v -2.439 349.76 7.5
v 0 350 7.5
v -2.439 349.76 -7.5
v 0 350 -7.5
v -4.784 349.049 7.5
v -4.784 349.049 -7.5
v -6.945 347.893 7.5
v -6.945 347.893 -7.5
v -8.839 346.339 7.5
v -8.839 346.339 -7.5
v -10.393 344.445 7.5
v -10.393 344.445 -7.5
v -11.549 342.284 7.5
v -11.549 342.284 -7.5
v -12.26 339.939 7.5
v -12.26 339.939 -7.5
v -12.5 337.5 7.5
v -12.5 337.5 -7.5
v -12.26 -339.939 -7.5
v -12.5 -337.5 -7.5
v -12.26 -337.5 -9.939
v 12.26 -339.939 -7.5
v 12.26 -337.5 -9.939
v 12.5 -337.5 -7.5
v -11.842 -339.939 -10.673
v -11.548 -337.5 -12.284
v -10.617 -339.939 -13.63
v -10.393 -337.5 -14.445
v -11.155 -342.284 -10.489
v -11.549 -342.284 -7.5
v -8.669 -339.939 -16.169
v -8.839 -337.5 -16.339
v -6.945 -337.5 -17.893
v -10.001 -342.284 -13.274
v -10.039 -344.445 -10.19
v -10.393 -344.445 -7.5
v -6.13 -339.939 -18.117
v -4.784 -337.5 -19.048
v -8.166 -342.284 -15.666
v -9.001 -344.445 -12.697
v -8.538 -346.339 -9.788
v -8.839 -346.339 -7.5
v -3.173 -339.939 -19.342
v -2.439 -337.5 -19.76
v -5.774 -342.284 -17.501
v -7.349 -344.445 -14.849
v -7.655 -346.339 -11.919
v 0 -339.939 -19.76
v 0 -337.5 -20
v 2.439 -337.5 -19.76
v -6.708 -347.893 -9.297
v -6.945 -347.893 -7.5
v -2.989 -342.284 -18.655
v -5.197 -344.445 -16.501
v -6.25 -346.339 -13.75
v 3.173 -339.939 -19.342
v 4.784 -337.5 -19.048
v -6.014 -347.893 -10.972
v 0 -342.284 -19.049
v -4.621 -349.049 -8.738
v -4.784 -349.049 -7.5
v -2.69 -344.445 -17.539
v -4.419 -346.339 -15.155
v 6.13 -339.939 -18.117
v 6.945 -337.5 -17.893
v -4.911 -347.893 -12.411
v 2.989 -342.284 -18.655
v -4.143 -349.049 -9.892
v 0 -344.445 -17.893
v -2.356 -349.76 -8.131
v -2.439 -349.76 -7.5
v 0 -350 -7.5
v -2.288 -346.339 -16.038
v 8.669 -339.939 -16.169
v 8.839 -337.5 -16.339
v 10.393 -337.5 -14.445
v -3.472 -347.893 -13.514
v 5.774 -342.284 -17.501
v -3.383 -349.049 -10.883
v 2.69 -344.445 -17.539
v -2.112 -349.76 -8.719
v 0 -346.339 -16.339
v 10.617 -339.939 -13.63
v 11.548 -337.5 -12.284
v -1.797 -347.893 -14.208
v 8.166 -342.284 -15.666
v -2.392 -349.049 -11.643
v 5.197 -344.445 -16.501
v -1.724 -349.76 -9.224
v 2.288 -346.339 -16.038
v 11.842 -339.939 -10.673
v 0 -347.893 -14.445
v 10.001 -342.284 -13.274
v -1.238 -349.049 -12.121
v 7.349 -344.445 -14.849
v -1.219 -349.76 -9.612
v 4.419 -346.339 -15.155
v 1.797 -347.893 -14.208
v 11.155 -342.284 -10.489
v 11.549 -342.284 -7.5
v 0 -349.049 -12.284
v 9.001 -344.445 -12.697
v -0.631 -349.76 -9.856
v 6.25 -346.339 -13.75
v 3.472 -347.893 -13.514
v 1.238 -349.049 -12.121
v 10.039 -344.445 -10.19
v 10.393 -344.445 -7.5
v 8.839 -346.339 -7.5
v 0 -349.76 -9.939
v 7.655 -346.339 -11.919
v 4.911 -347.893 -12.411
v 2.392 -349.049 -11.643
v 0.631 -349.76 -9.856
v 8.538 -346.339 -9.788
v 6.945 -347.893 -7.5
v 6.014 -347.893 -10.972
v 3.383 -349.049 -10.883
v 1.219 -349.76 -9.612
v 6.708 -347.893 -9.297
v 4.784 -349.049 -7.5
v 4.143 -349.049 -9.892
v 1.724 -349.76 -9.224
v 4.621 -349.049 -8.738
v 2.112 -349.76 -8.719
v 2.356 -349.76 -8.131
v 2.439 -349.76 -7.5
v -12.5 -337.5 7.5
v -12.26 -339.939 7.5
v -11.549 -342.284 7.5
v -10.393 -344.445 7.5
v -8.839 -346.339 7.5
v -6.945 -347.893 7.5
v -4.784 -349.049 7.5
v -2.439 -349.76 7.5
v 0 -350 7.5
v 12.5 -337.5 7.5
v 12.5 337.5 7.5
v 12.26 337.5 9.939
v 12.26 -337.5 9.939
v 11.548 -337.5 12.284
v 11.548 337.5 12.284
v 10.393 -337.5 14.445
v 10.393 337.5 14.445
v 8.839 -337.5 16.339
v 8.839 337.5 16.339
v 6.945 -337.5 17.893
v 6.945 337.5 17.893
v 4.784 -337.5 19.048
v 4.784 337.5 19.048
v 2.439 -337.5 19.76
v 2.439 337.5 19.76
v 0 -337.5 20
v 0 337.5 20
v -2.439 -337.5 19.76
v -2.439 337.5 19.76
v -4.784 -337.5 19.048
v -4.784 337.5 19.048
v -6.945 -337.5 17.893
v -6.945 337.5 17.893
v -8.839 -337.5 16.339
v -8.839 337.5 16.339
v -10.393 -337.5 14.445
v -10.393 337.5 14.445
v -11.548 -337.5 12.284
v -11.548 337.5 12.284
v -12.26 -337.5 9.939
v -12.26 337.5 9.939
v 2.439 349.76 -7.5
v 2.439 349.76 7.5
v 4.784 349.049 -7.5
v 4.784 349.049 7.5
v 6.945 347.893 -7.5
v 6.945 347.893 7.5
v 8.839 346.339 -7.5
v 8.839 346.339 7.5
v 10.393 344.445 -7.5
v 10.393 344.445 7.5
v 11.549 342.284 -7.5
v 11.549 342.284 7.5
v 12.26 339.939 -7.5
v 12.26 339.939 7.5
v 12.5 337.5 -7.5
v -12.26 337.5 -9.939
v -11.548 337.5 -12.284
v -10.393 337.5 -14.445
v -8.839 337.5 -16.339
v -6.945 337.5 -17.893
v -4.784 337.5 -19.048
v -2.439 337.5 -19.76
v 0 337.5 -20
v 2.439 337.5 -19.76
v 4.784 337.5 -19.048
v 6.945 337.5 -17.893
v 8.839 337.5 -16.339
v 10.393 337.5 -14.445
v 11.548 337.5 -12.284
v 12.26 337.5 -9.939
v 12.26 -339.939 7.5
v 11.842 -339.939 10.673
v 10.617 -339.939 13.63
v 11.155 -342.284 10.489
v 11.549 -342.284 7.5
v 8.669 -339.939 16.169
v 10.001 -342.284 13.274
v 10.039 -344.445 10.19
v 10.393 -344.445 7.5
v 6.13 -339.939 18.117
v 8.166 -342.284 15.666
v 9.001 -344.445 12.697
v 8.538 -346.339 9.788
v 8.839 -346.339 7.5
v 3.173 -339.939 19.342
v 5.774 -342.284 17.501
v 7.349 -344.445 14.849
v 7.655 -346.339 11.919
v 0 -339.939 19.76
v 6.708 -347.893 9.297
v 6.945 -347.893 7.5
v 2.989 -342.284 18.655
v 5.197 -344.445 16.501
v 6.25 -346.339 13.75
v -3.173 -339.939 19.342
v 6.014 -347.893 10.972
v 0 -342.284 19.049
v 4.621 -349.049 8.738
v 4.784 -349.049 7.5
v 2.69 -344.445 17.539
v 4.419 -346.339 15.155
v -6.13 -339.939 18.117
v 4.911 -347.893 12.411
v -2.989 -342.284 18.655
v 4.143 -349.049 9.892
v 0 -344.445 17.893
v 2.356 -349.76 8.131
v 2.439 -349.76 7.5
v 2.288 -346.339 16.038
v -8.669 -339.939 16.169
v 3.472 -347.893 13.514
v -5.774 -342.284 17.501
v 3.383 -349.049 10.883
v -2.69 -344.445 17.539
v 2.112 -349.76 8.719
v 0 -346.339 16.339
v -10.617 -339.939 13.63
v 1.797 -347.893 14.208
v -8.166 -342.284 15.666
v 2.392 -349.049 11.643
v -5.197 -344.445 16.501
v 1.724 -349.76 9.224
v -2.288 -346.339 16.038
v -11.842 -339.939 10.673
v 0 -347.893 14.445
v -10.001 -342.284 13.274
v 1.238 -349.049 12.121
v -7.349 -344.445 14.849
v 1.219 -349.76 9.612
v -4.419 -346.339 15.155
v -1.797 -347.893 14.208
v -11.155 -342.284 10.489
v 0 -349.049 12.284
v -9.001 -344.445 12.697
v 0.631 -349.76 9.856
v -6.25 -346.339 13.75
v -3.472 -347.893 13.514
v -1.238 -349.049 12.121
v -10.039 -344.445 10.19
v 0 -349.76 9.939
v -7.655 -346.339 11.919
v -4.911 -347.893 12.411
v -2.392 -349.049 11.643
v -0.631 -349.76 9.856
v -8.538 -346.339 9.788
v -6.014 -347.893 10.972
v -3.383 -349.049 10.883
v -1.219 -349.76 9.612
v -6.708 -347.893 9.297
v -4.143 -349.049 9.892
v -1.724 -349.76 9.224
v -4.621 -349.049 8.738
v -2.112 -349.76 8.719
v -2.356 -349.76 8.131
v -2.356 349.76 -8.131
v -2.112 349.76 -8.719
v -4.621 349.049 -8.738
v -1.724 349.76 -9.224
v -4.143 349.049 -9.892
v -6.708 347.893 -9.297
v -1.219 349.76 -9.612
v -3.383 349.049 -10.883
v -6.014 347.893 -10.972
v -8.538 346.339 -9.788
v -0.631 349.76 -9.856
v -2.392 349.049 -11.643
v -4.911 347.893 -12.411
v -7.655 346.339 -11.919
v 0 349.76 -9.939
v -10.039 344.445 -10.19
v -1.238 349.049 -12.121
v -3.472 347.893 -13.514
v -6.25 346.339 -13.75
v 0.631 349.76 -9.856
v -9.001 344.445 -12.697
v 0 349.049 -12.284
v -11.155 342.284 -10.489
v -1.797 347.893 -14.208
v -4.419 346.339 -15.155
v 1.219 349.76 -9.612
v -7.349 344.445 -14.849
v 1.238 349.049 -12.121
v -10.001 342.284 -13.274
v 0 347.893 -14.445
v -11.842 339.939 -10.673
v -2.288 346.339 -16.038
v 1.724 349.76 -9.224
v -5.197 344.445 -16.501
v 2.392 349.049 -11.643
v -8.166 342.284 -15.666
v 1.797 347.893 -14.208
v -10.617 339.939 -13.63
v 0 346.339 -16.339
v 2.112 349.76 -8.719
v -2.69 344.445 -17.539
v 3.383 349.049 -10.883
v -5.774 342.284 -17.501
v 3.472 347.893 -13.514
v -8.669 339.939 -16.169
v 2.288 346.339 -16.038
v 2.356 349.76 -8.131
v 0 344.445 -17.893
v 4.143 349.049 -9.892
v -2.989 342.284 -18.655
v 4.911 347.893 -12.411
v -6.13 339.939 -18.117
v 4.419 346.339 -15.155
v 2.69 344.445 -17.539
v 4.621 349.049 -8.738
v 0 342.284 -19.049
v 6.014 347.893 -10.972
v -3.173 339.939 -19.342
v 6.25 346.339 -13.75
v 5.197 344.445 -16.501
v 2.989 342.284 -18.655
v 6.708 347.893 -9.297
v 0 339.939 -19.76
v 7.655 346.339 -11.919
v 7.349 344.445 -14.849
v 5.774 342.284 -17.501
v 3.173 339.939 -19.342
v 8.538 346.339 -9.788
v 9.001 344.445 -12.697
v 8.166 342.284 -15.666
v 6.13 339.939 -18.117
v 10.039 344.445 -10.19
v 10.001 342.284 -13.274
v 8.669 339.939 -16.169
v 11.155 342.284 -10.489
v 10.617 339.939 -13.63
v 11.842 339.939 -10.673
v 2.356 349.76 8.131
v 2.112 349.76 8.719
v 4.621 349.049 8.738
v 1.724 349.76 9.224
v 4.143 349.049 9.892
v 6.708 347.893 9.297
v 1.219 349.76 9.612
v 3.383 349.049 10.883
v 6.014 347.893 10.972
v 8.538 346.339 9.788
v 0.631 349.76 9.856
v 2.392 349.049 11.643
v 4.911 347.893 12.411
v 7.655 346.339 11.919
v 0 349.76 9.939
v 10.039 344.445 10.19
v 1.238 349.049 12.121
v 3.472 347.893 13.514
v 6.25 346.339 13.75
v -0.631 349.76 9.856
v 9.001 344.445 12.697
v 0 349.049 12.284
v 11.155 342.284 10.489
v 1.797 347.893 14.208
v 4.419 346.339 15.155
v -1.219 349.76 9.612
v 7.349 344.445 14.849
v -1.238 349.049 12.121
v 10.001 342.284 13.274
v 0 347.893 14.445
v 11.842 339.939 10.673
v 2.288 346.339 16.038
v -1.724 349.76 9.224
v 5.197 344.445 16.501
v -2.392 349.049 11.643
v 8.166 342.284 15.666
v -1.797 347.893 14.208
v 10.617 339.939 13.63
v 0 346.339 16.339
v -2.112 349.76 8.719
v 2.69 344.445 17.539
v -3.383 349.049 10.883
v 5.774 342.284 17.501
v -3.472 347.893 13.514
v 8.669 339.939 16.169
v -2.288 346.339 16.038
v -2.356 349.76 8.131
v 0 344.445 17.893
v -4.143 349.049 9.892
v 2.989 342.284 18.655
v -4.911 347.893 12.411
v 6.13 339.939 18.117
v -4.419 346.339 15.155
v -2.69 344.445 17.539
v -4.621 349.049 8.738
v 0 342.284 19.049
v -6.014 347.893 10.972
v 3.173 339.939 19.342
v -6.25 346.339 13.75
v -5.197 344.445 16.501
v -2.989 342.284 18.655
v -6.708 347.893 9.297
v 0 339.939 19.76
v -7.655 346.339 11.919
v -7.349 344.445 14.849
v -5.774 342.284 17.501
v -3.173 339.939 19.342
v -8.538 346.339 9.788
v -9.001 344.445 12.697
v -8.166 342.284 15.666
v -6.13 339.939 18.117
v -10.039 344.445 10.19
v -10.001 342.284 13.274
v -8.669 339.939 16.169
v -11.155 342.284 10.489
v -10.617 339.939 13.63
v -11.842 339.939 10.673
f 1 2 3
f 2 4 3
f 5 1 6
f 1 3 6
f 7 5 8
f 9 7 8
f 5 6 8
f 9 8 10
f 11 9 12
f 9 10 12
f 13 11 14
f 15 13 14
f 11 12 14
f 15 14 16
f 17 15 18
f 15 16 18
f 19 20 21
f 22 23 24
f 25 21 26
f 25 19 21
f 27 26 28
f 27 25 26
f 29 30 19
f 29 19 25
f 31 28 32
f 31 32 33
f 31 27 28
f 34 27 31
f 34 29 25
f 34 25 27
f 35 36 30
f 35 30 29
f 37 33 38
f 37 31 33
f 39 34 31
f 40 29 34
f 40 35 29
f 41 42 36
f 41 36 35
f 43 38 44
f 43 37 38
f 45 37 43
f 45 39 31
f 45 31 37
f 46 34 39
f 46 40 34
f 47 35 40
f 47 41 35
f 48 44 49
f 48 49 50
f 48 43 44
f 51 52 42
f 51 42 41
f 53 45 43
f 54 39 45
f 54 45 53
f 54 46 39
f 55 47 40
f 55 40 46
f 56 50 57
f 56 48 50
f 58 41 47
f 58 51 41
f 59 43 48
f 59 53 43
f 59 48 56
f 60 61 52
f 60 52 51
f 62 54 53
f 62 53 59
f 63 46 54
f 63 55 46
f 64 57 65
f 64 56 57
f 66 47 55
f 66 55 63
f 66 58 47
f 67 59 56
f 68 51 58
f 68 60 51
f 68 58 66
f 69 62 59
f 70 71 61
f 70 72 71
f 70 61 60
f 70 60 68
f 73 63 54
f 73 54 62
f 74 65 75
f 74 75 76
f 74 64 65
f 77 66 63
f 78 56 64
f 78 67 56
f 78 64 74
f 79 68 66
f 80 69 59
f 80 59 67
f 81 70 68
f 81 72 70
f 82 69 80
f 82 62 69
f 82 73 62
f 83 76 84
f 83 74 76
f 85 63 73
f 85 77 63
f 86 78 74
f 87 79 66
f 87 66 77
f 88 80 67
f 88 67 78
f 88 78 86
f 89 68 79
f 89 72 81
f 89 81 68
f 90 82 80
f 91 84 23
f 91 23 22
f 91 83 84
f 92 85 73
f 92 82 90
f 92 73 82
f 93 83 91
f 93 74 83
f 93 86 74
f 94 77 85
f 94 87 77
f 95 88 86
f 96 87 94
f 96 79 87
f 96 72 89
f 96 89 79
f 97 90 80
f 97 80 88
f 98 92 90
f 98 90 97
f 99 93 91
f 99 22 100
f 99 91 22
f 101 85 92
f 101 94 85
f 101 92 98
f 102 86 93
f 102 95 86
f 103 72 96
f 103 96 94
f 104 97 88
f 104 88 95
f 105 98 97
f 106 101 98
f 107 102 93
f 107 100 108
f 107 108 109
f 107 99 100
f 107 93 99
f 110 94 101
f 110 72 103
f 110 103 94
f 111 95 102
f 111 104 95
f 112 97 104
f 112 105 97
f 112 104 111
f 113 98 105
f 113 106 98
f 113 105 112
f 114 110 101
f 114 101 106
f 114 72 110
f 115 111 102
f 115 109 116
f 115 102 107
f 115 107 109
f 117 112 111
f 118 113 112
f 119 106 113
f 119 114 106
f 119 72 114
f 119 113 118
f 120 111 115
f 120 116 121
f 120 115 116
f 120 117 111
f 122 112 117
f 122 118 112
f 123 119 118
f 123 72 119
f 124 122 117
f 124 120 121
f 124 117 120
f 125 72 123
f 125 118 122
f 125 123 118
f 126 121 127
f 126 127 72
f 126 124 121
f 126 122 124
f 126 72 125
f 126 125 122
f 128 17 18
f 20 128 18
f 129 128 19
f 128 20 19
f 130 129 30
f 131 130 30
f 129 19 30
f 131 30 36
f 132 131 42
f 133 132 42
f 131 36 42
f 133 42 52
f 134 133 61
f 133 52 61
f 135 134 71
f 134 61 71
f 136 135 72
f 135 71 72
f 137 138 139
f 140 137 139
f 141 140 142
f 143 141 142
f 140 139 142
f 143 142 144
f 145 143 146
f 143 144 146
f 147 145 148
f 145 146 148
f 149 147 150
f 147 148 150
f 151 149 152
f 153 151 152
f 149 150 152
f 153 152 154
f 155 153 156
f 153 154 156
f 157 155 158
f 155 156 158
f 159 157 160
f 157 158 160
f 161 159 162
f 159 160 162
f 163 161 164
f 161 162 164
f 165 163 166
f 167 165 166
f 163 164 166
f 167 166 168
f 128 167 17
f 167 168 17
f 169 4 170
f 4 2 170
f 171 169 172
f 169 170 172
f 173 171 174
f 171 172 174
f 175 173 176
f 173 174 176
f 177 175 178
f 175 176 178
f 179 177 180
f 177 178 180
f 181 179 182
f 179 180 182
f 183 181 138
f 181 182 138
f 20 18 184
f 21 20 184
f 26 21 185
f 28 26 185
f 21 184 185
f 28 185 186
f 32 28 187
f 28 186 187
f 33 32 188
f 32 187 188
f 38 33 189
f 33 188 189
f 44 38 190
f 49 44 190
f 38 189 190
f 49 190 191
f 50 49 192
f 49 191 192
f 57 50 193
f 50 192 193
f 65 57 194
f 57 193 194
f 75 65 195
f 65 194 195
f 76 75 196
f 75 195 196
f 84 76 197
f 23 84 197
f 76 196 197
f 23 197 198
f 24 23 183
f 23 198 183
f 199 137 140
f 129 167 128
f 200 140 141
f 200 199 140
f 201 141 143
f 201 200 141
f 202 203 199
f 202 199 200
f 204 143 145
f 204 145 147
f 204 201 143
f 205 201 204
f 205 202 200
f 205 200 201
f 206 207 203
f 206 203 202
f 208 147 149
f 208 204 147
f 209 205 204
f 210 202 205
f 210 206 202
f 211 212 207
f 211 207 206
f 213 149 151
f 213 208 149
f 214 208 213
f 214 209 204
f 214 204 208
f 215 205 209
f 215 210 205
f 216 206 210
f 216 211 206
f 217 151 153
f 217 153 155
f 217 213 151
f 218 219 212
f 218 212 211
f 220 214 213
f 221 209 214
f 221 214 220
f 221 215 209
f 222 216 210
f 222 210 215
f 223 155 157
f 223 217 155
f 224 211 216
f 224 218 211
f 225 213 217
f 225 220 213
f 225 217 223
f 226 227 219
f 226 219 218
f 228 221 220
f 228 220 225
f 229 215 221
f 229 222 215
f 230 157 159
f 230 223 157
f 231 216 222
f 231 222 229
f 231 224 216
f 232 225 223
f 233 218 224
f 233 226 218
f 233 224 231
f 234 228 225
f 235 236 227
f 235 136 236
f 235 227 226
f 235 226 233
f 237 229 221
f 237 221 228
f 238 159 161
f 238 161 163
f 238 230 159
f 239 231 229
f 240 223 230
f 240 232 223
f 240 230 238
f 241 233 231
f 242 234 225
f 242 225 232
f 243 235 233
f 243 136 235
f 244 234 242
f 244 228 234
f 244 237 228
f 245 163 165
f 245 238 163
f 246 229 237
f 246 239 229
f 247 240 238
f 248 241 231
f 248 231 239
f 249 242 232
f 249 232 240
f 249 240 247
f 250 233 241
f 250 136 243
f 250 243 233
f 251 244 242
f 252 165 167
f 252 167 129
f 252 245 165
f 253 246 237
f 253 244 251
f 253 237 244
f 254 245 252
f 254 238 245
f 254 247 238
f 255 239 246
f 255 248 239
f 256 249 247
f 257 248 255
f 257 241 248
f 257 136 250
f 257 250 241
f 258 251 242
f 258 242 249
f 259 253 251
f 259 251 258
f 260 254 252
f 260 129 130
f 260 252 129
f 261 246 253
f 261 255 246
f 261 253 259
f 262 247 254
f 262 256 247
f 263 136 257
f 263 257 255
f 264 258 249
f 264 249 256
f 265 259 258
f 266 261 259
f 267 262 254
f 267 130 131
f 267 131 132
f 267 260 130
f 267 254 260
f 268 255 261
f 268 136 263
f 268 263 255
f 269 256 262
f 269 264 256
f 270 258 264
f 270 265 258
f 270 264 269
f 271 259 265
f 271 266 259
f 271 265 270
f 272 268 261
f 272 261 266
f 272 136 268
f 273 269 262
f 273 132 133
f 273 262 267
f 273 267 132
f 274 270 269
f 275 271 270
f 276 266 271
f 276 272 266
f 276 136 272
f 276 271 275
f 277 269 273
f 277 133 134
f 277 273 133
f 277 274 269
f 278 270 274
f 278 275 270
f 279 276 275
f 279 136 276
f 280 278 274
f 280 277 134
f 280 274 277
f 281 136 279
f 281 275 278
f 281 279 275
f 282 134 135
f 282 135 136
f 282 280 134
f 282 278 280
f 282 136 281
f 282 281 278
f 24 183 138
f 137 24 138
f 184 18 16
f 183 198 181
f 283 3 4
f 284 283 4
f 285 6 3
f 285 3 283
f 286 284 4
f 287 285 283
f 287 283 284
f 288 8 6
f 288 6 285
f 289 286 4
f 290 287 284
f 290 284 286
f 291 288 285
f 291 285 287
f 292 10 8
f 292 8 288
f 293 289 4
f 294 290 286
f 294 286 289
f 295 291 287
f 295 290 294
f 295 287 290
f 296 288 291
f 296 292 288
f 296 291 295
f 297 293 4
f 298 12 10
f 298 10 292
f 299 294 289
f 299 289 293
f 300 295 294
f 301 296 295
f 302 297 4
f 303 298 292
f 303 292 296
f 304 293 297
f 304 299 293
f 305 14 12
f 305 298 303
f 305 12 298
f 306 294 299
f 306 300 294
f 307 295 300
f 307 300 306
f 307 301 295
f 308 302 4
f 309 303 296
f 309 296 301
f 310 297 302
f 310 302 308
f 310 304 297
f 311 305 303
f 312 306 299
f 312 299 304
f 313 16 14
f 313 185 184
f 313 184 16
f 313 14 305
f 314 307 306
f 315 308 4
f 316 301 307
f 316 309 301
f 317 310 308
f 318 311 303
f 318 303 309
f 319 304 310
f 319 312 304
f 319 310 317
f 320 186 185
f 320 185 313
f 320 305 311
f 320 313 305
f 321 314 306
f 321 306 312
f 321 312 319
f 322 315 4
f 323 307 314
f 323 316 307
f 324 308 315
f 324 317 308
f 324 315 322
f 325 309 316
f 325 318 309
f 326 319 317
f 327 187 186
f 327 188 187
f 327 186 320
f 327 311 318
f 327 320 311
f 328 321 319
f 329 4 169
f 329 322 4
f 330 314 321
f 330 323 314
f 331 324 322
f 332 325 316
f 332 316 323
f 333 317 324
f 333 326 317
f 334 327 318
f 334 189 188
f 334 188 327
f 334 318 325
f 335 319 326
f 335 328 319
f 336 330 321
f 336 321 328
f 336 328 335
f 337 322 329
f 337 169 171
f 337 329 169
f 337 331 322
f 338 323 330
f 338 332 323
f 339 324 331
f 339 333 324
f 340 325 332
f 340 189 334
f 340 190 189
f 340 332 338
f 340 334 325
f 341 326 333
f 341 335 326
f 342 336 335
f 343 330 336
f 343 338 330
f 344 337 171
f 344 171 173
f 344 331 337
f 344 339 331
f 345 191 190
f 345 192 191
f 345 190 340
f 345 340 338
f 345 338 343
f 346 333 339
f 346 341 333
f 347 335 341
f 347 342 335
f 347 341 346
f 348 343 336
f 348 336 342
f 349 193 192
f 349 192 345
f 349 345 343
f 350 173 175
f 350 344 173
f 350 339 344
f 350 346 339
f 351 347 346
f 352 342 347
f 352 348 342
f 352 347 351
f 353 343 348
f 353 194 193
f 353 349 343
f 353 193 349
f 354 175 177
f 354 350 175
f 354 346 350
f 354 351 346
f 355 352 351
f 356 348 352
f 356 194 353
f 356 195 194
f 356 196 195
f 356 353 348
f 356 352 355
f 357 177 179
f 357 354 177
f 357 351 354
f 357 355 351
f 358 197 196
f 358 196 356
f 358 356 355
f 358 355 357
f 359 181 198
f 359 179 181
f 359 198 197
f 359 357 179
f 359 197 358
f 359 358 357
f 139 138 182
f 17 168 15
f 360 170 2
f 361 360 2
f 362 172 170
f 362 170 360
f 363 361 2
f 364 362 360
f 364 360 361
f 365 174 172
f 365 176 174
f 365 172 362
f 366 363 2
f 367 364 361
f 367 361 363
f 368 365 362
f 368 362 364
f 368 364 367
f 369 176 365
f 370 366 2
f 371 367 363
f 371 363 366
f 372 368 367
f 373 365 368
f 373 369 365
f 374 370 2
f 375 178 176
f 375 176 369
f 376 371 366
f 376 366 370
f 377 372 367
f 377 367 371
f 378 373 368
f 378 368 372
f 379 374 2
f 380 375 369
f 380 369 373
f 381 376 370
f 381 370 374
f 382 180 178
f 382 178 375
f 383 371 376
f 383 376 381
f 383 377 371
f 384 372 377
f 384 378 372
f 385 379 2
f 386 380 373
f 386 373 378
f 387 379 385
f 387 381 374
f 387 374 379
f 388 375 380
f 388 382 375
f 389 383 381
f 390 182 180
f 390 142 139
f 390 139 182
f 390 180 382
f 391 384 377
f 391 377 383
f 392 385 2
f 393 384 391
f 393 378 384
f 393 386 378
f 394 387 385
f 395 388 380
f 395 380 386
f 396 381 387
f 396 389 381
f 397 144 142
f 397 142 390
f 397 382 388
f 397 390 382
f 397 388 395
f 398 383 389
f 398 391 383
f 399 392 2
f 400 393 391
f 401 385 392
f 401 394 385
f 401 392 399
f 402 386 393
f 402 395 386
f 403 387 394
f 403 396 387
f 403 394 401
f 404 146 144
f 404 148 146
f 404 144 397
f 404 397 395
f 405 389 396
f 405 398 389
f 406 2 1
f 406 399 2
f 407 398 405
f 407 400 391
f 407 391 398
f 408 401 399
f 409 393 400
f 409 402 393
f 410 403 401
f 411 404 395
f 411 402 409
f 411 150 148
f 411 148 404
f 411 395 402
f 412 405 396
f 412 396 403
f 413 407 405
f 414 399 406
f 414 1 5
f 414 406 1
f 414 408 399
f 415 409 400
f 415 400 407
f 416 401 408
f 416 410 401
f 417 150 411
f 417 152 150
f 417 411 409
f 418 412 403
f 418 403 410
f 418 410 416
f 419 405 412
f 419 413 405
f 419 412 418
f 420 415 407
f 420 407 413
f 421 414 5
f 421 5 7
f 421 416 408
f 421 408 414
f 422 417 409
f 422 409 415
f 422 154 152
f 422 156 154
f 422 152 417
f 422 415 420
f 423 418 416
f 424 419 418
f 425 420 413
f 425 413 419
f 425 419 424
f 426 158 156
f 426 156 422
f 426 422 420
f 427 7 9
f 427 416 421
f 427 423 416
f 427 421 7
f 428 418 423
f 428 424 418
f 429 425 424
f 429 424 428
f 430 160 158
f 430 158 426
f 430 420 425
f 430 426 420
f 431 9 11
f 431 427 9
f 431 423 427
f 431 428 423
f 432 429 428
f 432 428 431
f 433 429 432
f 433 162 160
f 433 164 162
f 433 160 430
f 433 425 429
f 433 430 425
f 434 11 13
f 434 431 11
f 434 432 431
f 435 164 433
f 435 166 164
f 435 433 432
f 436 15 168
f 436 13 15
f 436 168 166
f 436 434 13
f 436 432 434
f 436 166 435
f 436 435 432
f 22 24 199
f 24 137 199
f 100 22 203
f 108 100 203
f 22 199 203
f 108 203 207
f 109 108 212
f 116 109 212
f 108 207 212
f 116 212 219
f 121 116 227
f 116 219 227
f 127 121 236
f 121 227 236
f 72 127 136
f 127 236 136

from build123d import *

# Parameters (mm, degrees)
BOSS_EXTRUDE1_DEPTH = 350
FILLET1_R           = 12.5


with BuildPart() as part:
    # Sketch2 → Boss-Extrude1 (new, symmetric)
    with BuildSketch(Plane(origin=(0, 0, 0), x_dir=(-1, 0, 0), z_dir=(0, 1, 0))):
        with BuildLine():
            Line((12.5, 7.5), (12.5, -7.5))
            ThreePointArc((12.5, -7.5), (0, -20), (-12.5, -7.5))
            Line((-12.5, -7.5), (-12.5, 7.5))
            ThreePointArc((-12.5, 7.5), (0, 20), (12.5, 7.5))
        make_face()
    extrude(amount=BOSS_EXTRUDE1_DEPTH, both=True)

    # Fillet1
    fillet1_edges = [part.edges().sort_by_distance(p)[0] for p in [
        (0, 350, -20),
        (-12.5, 350, 0),
        (0, 350, 20),
        (-12.5, -350, 0),
        (0, -350, -20),
        (12.5, -350, 0),
        (0, -350, 20),
        (12.5, 350, 0),
    ]]
    fillet(fillet1_edges, radius=FILLET1_R - 0.0001)  # a hair under: the kernel refuses the full size


solid = part.part
